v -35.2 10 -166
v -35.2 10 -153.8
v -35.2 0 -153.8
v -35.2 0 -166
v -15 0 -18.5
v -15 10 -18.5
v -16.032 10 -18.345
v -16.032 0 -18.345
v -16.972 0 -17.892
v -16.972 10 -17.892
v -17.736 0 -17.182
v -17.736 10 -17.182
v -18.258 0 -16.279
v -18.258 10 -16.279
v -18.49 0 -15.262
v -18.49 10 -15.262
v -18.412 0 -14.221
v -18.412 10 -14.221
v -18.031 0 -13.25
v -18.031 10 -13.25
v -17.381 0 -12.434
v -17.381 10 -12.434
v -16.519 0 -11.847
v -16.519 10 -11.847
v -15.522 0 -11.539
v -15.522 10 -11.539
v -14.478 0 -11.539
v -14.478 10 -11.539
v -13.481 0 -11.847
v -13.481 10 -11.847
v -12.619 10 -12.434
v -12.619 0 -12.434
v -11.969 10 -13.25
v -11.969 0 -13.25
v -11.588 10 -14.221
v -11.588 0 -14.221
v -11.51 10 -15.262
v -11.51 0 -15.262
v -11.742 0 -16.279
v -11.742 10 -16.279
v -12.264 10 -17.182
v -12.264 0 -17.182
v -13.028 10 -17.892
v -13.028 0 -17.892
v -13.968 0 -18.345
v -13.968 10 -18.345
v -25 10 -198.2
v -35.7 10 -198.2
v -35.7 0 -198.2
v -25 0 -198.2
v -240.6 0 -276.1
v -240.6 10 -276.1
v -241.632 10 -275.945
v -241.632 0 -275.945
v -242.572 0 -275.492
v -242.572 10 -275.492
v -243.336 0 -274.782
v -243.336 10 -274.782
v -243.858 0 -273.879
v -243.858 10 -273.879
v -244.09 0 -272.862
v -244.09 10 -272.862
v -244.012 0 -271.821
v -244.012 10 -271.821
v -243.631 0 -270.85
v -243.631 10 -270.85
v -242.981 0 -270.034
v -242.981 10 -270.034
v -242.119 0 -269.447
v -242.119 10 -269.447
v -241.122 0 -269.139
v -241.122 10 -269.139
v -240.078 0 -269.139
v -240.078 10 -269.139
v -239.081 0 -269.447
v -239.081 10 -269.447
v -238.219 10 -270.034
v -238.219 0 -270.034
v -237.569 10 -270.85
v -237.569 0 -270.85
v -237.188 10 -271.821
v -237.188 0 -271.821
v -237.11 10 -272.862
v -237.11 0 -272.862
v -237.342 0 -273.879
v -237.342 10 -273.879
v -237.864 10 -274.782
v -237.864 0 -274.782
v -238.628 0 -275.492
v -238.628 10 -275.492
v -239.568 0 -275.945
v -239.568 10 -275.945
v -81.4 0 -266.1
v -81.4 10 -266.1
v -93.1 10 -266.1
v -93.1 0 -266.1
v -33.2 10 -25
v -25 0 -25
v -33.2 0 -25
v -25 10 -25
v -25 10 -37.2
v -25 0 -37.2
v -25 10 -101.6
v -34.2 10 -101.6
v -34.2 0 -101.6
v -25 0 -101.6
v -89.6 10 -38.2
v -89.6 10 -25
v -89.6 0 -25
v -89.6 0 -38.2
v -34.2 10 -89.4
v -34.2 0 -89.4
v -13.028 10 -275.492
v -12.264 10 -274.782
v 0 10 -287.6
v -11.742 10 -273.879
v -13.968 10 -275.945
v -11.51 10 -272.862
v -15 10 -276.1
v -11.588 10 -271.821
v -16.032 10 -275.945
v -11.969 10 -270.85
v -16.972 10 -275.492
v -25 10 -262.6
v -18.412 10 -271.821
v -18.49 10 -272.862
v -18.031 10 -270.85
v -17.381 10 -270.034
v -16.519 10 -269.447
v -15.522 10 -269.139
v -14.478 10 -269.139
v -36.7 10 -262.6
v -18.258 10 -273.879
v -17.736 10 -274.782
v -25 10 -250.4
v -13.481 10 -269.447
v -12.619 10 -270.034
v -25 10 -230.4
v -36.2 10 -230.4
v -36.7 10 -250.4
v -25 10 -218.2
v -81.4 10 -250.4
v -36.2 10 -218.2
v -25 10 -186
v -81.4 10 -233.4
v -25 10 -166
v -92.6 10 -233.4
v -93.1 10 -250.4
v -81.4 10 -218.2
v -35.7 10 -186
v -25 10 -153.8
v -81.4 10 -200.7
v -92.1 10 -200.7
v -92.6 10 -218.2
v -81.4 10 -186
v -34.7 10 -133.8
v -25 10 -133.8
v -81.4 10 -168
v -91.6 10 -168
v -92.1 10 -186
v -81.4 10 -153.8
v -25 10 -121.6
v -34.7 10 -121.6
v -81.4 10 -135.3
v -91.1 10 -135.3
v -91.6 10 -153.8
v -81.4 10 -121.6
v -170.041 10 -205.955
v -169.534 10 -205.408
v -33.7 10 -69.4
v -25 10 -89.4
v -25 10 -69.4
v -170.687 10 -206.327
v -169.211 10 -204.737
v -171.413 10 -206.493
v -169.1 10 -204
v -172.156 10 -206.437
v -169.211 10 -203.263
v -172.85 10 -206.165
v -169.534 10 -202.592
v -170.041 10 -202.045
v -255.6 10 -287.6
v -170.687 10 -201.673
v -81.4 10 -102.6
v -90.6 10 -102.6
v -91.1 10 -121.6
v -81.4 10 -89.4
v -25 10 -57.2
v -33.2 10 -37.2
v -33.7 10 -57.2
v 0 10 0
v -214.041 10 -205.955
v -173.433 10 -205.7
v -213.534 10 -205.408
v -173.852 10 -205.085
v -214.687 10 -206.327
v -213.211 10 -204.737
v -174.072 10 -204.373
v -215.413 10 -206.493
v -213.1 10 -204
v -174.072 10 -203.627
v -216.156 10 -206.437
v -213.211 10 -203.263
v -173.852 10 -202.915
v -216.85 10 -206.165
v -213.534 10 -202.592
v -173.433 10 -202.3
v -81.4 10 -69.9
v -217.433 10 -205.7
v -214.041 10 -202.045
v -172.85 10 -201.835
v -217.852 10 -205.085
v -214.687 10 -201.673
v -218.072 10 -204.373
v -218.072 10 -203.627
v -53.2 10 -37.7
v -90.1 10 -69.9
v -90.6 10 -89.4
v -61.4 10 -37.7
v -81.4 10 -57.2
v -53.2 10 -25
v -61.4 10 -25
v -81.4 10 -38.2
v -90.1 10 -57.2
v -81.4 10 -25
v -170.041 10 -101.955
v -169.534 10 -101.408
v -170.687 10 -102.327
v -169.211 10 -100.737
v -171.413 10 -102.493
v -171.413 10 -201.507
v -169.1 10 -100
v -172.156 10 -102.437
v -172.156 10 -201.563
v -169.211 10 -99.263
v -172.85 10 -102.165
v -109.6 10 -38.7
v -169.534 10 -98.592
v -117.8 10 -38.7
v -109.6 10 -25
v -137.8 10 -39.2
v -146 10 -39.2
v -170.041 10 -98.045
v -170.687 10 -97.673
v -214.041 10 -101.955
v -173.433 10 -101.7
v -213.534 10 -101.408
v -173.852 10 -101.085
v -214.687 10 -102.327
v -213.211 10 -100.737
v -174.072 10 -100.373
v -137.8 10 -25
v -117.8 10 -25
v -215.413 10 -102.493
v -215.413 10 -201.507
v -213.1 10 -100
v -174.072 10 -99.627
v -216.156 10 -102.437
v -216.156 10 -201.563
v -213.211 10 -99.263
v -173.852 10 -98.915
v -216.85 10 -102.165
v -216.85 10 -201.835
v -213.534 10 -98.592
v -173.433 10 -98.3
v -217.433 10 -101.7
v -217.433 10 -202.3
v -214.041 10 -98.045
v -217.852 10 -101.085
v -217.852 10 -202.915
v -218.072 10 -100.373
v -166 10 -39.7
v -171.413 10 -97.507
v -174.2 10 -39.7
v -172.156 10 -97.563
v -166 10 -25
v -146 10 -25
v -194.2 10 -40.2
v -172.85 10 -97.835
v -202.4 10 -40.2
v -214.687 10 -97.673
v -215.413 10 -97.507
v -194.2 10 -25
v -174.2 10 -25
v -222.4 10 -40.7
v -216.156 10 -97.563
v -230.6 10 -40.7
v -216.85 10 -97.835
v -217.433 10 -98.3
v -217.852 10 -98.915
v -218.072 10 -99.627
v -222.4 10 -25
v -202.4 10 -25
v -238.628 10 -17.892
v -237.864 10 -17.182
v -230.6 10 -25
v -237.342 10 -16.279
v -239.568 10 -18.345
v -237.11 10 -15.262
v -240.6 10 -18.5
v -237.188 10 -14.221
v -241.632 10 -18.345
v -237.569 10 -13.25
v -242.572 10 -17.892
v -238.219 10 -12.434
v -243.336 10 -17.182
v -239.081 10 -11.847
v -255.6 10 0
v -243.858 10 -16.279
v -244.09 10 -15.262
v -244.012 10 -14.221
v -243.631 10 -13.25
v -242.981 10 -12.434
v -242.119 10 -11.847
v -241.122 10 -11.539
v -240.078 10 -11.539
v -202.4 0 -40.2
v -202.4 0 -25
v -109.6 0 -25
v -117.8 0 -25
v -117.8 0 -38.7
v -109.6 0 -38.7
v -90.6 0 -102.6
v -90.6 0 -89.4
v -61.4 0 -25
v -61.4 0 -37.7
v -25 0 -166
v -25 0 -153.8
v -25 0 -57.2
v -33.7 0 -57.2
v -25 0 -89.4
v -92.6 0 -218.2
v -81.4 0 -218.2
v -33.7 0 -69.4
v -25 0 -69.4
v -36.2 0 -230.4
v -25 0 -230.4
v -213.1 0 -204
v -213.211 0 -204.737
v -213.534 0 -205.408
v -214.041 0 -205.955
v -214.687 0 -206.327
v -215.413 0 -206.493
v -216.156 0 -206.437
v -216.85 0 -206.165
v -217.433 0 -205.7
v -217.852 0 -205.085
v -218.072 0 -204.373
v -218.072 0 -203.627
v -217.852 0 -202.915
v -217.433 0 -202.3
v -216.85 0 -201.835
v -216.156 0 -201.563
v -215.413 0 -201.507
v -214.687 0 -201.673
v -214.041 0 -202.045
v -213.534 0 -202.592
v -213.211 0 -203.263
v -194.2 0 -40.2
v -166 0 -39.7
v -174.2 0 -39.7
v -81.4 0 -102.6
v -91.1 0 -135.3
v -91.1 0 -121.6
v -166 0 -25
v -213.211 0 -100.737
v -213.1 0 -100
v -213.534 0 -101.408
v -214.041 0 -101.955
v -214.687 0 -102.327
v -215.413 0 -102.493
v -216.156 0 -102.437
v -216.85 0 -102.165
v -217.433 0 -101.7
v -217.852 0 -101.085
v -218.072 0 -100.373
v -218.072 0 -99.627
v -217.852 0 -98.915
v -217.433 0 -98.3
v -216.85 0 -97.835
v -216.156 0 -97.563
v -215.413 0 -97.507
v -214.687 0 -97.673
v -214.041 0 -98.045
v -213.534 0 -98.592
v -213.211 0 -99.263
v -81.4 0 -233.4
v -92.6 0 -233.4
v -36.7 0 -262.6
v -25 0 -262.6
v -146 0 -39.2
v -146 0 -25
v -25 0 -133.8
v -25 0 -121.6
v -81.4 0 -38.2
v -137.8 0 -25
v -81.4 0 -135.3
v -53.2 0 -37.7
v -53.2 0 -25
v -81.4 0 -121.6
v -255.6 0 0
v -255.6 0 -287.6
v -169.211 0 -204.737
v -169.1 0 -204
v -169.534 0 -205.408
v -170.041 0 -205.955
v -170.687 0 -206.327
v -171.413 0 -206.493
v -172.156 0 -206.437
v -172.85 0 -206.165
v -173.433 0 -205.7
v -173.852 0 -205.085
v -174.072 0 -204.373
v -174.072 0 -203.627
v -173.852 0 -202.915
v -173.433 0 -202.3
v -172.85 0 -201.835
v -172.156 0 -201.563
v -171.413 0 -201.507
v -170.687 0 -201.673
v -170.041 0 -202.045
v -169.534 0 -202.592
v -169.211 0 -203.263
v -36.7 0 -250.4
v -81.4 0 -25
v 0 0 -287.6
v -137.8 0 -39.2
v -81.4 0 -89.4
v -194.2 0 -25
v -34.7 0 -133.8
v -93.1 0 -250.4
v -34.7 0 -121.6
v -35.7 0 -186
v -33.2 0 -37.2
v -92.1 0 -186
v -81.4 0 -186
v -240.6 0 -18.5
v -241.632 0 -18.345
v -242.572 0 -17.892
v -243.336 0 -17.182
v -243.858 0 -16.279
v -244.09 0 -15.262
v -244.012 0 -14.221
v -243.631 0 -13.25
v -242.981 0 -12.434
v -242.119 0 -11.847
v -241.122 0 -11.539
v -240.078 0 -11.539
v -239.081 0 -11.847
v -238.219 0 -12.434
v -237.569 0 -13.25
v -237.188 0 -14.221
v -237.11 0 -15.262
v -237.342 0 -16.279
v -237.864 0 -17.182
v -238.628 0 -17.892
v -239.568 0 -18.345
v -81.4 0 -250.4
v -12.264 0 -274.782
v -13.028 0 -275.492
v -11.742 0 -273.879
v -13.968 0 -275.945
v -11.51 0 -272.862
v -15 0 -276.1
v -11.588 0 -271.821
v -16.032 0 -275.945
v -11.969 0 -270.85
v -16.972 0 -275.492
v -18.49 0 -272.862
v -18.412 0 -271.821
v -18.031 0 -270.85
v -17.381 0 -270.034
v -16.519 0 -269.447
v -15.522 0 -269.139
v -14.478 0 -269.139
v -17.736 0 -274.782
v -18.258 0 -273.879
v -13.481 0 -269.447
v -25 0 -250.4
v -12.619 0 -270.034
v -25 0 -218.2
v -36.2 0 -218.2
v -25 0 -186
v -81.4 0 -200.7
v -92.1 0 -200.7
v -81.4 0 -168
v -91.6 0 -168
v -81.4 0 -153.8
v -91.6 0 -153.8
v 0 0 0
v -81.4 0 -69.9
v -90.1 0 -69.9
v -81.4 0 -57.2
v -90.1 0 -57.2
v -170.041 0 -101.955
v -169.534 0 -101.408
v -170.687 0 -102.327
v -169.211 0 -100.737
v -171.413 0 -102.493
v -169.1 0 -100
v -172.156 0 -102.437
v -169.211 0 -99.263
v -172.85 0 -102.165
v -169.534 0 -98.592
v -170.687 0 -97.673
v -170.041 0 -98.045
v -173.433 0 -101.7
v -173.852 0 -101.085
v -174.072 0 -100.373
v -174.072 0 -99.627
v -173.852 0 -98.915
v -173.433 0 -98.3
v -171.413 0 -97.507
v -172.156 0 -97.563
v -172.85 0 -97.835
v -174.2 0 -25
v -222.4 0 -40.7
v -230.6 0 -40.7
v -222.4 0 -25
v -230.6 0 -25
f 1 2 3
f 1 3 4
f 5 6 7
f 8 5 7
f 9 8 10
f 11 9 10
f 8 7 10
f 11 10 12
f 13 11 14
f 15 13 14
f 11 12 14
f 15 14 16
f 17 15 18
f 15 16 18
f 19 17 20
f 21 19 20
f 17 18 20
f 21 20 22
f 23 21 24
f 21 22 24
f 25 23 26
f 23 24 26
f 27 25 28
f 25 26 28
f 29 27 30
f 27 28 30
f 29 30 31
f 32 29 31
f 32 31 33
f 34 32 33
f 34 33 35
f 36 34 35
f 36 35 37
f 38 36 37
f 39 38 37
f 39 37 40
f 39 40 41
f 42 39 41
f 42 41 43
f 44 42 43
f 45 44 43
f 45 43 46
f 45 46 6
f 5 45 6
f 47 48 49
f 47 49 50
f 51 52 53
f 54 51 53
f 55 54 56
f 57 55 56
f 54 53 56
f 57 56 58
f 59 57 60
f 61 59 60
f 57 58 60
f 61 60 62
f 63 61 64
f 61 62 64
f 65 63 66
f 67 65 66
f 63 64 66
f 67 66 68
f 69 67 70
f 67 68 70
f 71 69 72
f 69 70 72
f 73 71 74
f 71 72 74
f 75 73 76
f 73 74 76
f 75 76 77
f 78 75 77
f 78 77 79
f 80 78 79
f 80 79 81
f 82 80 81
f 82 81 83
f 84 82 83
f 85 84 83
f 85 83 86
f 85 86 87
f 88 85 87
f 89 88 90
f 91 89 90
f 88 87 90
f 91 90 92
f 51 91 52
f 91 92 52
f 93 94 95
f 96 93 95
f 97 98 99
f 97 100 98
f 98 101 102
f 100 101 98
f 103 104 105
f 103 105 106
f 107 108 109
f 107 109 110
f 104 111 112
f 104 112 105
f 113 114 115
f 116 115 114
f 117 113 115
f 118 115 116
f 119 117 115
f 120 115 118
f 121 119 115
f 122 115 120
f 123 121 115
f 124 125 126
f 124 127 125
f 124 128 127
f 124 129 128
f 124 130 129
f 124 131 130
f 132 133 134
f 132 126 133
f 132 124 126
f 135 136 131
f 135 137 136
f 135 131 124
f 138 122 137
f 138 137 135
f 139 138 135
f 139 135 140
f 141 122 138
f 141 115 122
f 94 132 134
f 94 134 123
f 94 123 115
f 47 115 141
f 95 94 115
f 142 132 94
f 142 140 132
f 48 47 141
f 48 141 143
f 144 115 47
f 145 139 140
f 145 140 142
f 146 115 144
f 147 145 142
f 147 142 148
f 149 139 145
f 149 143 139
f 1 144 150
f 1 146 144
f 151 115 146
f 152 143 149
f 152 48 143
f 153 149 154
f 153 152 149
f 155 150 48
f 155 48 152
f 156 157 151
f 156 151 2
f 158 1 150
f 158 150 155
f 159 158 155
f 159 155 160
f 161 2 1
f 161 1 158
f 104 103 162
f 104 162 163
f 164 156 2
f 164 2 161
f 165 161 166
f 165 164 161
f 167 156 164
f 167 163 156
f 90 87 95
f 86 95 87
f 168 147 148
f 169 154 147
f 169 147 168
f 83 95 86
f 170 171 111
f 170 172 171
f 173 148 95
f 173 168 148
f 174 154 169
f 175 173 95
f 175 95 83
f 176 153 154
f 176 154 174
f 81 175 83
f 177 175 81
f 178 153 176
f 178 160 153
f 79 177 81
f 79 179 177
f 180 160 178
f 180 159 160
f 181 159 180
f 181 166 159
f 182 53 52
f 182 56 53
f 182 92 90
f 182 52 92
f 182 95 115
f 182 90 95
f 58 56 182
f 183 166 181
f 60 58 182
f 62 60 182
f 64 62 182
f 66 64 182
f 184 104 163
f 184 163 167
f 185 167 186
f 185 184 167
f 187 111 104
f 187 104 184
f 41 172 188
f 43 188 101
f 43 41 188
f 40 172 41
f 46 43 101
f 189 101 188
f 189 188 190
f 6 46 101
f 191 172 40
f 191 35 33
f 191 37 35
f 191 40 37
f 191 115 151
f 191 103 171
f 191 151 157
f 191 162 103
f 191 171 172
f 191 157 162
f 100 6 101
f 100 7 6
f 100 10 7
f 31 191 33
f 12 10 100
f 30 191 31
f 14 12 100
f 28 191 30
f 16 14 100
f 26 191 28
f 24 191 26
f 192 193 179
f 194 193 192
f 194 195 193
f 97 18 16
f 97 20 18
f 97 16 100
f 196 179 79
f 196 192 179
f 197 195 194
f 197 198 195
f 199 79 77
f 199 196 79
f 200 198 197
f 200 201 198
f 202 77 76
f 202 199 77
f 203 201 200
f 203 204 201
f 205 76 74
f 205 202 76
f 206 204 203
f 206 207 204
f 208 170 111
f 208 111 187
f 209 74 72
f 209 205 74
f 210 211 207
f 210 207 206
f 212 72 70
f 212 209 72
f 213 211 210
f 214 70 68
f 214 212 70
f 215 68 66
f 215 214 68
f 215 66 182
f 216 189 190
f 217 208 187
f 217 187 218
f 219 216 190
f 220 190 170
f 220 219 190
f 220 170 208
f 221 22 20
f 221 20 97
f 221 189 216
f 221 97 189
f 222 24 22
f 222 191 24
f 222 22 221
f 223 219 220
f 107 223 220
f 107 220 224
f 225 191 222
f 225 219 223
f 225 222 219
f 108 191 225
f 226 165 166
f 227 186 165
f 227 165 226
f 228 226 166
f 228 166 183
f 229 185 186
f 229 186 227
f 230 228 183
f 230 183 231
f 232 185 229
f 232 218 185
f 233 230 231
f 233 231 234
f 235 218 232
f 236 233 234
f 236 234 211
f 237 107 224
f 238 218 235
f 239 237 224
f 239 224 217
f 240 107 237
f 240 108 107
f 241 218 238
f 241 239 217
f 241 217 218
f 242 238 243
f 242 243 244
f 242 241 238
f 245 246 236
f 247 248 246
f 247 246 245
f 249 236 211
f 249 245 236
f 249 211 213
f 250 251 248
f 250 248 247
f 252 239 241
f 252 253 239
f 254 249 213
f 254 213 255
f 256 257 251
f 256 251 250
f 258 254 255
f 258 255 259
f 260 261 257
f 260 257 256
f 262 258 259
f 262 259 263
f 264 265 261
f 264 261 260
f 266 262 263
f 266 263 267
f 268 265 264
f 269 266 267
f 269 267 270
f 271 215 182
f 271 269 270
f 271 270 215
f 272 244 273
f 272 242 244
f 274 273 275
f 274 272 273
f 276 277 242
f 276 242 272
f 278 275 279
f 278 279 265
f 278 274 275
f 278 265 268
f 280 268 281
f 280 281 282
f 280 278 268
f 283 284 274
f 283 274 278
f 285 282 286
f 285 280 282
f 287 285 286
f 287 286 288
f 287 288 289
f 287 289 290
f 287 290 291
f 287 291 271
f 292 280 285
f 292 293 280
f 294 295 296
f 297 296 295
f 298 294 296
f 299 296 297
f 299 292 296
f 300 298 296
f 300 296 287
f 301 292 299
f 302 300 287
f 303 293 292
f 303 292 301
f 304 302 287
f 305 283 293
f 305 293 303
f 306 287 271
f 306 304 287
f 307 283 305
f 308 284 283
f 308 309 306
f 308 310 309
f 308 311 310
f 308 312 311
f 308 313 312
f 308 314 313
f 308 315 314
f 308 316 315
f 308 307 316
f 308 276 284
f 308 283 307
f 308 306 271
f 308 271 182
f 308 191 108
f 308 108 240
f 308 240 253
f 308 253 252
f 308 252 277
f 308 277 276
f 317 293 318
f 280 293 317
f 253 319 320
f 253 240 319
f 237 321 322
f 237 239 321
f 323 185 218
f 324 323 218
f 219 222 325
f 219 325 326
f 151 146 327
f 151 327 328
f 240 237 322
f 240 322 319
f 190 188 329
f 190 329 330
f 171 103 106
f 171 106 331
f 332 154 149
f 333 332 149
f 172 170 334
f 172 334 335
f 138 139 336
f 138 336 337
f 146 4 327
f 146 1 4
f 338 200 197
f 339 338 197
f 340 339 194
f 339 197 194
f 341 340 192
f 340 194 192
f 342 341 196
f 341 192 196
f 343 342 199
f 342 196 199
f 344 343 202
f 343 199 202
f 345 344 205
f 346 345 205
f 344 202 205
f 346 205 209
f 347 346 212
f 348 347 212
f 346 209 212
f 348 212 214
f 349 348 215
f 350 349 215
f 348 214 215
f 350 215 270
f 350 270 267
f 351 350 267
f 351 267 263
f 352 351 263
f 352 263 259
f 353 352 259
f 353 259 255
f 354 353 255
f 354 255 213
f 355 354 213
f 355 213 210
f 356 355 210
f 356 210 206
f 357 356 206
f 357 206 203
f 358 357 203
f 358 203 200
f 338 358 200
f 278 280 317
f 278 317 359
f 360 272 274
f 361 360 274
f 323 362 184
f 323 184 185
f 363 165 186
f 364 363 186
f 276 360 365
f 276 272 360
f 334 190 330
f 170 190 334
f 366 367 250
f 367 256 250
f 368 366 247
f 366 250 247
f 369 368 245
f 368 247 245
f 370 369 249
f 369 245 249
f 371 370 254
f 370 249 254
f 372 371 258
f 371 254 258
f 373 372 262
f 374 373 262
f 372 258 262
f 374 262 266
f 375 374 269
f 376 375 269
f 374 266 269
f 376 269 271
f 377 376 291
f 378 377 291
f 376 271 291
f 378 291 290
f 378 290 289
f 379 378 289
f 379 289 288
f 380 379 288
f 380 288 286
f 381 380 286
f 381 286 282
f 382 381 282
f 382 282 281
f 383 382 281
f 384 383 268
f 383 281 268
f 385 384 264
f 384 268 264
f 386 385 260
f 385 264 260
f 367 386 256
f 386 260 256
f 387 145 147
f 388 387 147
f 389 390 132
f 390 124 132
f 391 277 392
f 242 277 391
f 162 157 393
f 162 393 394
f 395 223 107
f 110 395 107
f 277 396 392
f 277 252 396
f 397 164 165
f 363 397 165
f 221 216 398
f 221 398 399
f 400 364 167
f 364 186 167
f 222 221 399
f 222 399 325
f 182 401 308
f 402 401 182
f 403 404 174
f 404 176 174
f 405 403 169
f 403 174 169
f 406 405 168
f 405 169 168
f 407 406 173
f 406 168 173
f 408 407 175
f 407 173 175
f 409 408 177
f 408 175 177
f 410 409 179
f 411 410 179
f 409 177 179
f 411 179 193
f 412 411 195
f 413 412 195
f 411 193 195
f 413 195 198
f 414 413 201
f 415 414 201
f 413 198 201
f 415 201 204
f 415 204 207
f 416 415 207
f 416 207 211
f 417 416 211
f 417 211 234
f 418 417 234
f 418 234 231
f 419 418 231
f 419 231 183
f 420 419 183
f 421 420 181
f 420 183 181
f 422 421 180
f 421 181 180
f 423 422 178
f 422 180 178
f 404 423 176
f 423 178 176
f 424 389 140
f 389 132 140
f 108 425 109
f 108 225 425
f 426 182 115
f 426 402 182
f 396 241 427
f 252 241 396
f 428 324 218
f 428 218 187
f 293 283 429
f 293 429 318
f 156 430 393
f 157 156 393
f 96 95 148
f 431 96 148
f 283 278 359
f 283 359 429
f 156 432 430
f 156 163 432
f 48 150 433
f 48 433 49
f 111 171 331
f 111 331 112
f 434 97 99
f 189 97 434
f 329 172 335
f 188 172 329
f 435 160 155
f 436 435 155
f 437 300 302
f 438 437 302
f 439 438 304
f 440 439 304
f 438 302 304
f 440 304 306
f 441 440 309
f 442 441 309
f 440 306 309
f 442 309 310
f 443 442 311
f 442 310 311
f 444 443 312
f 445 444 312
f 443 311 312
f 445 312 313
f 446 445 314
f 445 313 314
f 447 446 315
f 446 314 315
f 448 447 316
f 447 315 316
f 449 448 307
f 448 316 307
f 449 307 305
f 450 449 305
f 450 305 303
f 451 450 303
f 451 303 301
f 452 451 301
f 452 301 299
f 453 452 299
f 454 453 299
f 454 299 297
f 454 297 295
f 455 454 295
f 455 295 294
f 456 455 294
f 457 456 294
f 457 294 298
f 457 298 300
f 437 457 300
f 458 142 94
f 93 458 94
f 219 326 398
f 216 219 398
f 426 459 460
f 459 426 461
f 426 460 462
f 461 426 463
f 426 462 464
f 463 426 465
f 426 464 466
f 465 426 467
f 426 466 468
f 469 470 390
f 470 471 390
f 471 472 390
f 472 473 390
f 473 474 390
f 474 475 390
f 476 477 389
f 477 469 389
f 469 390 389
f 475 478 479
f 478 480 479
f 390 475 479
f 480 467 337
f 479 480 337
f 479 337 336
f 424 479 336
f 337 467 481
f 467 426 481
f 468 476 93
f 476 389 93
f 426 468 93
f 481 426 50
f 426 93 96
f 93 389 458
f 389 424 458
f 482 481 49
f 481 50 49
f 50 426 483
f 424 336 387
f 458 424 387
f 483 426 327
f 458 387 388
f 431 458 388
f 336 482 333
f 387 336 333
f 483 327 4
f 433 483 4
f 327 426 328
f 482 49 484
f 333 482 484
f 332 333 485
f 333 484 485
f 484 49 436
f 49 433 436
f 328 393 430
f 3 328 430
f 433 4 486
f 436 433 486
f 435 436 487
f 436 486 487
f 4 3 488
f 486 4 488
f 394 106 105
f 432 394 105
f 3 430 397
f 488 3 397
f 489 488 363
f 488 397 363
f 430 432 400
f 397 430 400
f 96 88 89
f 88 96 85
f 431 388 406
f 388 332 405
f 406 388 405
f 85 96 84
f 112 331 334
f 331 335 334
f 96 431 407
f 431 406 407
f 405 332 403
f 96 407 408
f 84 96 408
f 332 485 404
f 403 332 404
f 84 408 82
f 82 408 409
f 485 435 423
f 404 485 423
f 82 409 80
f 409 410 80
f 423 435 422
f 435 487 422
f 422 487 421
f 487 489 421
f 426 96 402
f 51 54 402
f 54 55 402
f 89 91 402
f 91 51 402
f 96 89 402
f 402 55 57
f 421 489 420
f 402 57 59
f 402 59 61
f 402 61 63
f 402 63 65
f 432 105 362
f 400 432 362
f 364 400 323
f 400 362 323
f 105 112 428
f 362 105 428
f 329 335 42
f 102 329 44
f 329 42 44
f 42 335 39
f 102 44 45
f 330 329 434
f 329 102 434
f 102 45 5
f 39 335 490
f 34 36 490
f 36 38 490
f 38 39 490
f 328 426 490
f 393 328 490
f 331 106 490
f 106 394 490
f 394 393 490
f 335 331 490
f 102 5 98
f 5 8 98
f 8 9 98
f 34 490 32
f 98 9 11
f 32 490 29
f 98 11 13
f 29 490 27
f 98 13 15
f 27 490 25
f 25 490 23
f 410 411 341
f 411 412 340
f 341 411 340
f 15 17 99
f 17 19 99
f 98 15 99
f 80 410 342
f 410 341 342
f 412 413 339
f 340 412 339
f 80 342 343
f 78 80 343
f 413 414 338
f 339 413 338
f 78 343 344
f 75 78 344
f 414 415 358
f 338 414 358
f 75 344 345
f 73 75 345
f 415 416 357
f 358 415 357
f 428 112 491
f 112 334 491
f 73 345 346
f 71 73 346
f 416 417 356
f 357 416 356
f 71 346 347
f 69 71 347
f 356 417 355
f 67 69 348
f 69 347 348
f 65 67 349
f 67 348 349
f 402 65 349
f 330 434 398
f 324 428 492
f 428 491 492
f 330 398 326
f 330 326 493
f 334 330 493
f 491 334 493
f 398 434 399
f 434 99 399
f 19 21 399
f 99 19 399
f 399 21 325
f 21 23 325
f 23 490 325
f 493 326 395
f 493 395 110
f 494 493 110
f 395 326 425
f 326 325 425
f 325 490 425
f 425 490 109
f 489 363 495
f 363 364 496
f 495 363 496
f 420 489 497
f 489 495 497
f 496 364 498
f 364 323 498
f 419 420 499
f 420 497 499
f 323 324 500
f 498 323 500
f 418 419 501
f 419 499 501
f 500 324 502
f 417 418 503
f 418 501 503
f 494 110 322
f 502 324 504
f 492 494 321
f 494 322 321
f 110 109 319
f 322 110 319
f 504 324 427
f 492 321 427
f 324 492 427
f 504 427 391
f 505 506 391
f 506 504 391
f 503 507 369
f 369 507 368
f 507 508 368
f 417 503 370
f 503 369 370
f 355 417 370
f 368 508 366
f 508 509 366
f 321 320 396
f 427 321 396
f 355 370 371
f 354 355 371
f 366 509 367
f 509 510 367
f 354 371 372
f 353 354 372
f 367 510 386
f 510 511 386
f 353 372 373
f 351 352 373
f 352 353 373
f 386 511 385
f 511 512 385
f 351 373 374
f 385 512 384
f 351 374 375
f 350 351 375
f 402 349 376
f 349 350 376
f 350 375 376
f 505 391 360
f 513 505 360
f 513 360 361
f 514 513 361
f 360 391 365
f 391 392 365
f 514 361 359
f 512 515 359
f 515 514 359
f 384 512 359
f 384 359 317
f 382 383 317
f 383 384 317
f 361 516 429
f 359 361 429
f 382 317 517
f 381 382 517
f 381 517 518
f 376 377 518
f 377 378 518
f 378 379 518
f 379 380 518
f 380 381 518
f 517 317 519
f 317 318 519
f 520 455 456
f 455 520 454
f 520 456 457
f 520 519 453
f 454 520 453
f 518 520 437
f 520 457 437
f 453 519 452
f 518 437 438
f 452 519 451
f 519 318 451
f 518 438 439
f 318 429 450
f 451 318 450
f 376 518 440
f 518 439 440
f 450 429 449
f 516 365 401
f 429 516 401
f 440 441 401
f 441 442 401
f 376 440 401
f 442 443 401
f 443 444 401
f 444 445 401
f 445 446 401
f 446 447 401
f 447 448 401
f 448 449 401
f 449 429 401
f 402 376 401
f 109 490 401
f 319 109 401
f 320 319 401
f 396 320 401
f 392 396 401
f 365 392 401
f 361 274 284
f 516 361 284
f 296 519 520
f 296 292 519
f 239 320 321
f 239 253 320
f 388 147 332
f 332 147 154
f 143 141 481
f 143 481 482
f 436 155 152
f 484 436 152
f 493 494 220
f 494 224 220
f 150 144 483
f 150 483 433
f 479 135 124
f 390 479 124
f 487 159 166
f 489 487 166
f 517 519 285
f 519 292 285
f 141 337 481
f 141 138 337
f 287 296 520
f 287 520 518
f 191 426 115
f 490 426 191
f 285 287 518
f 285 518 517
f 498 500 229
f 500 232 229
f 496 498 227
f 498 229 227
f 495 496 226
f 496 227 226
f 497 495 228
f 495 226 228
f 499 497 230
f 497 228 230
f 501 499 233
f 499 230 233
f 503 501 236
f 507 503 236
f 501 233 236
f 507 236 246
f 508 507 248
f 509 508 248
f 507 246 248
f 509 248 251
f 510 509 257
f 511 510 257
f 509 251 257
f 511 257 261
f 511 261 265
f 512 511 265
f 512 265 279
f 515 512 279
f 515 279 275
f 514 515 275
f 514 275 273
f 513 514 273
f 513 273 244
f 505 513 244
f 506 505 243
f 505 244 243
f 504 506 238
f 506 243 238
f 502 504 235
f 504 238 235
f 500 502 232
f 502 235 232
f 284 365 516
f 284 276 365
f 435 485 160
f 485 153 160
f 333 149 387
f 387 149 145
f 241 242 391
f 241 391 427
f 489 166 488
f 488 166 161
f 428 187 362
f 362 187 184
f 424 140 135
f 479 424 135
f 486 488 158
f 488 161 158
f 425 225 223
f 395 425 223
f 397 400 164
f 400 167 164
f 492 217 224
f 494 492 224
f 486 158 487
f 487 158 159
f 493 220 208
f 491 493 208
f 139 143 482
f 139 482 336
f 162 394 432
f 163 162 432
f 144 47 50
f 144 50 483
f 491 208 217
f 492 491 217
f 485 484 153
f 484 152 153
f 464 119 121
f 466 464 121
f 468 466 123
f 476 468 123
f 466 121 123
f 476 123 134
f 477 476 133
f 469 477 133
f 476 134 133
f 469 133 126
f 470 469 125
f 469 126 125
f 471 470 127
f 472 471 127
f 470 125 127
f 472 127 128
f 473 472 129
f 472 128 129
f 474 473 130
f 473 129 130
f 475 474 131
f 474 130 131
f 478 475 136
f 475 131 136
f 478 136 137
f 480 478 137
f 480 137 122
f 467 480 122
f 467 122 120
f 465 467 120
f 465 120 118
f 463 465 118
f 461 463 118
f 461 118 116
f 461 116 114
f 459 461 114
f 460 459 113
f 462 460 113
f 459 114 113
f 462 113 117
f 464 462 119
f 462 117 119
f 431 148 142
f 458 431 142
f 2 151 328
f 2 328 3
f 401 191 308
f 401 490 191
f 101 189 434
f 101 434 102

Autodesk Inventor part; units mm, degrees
ref_plane "YZ Plane" through (0, 0, 0) normal (1, 0, 0) x (0, 1, 0)
ref_plane "XZ Plane" through (0, 0, 0) normal (0, 1, 0) x (-1, 0, 0)
ref_plane "XY Plane" through (0, 0, 0) normal (0, 0, 1) x (1, 0, 0)
sketch "Skizze1" plane through (0, 0, 0) normal (0, 1, 0) x (-1, 0, 0)
  line L0 (0, 0) -> (255.6, 0)
  line L1 (255.6, 0) -> (255.6, -287.6)
  line L2 (255.6, -287.6) -> (0, -287.6)
  line L3 (0, -287.6) -> (0, 0)
  dimension "d0" = 287.6
  dimension "d1" = 255.6
extrude "Extrusion1" add sketch "Skizze1" along normal blind 10
sketch "Skizze4" plane through (0, 10, 0) normal (0, 1, 0) x (1, 0, 0)
  line L0 (-25, 25) -> (-33.2, 25)
  line L1 (-33.2, 25) -> (-33.2, 37.2)
  line L2 (-33.2, 37.2) -> (-25, 37.2)
  line L3 (-25, 37.2) -> (-25, 25)
  line L4 (-109.6, 25) -> (-117.8, 25)
  line L5 (-117.8, 25) -> (-117.8, 38.7)
  line L6 (-117.8, 38.7) -> (-109.6, 38.7)
  line L7 (-109.6, 38.7) -> (-109.6, 25)
  line L8 (-137.8, 25) -> (-146, 25)
  line L9 (-146, 25) -> (-146, 39.2)
  line L10 (-146, 39.2) -> (-137.8, 39.2)
  line L11 (-137.8, 39.2) -> (-137.8, 25)
  line L12 (-166, 39.7) -> (-166, 25)
  line L13 (-222.4, 25) -> (-230.6, 25)
  line L14 (-230.6, 25) -> (-230.6, 40.7)
  line L15 (-25, 57.2) -> (-33.7, 57.2)
  line L16 (-33.7, 57.2) -> (-33.7, 69.4)
  line L17 (-33.7, 69.4) -> (-25, 69.4)
  line L18 (-25, 69.4) -> (-25, 57.2)
  line L19 (-25, 89.4) -> (-34.2, 89.4)
  line L20 (-34.2, 89.4) -> (-34.2, 101.6)
  line L21 (-34.2, 101.6) -> (-25, 101.6)
  line L22 (-25, 101.6) -> (-25, 89.4)
  line L23 (-25, 121.6) -> (-34.7, 121.6)
  line L24 (-34.7, 121.6) -> (-34.7, 133.8)
  line L25 (-34.7, 133.8) -> (-25, 133.8)
  line L26 (-25, 133.8) -> (-25, 121.6)
  line L27 (-25, 153.8) -> (-35.2, 153.8)
  line L28 (-35.2, 153.8) -> (-35.2, 166)
  line L29 (-35.2, 166) -> (-25, 166)
  line L30 (-25, 166) -> (-25, 153.8)
  line L31 (-25, 186) -> (-35.7, 186)
  line L32 (-35.7, 186) -> (-35.7, 198.2)
  line L33 (-35.7, 198.2) -> (-25, 198.2)
  line L34 (-25, 198.2) -> (-25, 186)
  line L35 (-25, 230.4) -> (-25, 218.2)
  line L36 (-222.4, 25) -> (-222.4, 38.5)
  line L37 (-222.4, 38.5) -> (-222.4, 40.7)
  line L38 (-230.6, 40.7) -> (-222.4, 40.7)
  line L39 (-25, 218.2) -> (-36.2, 218.2)
  line L40 (-36.2, 218.2) -> (-36.2, 230.4)
  line L41 (-36.2, 230.4) -> (-25, 230.4)
  line L42 (-25, 250.4) -> (-25, 262.6)
  line L43 (-25, 262.6) -> (-36.7, 262.6)
  line L44 (-36.7, 262.6) -> (-36.7, 250.4)
  line L45 (-36.7, 250.4) -> (-25, 250.4)
  line L46 (-53.2, 25) -> (-61.4, 25)
  line L47 (-61.4, 25) -> (-61.4, 37.7)
  line L48 (-61.4, 37.7) -> (-53.2, 37.7)
  line L49 (-53.2, 37.7) -> (-53.2, 25)
  line L50 (-89.6, 25) -> (-89.6, 37.7)
  line L51 (-89.6, 37.7) -> (-89.6, 38.2)
  line L52 (0, 0) -> (0, 287.6) projected
  line L53 (-255.6, 0) -> (0, 0) projected
  line L54 (-81.4, 69.9) -> (-90.1, 69.9)
  line L55 (-90.1, 69.9) -> (-90.1, 57.2)
  line L56 (-90.1, 57.2) -> (-81.4, 57.2)
  line L57 (-81.4, 102.6) -> (-90.6, 102.6)
  line L58 (-90.6, 102.6) -> (-90.6, 89.4)
  line L59 (-90.6, 89.4) -> (-81.4, 89.4)
  line L60 (-81.4, 121.6) -> (-81.4, 135.3)
  line L61 (-81.4, 135.3) -> (-91.1, 135.3)
  line L62 (-91.1, 135.3) -> (-91.1, 121.6)
  line L63 (-91.1, 121.6) -> (-81.4, 121.6)
  line L64 (-81.4, 153.8) -> (-81.4, 168)
  line L65 (-81.4, 168) -> (-91.6, 168)
  line L66 (-91.6, 168) -> (-91.6, 153.8)
  line L67 (-91.6, 153.8) -> (-81.4, 153.8)
  line L68 (-81.4, 186) -> (-81.4, 200.7)
  line L69 (-81.4, 200.7) -> (-92.1, 200.7)
  line L70 (-92.1, 200.7) -> (-92.1, 186)
  line L71 (-92.1, 186) -> (-81.4, 186)
  line L72 (-81.4, 218.2) -> (-81.4, 233.4)
  line L73 (-81.4, 233.4) -> (-92.6, 233.4)
  line L74 (-92.6, 233.4) -> (-92.6, 218.2)
  line L75 (-92.6, 218.2) -> (-81.4, 218.2)
  line L76 (-81.4, 250.4) -> (-81.4, 266.1)
  line L77 (-81.4, 266.1) -> (-93.1, 266.1)
  line L78 (-93.1, 266.1) -> (-93.1, 250.4)
  line L79 (-93.1, 250.4) -> (-81.4, 250.4)
  line L80 (-194.2, 25) -> (-202.4, 25)
  line L81 (-202.4, 25) -> (-202.4, 40.2)
  line L82 (-202.4, 40.2) -> (-194.2, 40.2)
  line L83 (-194.2, 40.2) -> (-194.2, 25)
  line L84 (-166, 25) -> (-174.2, 25)
  line L85 (-166, 39.7) -> (-174.2, 39.7)
  line L86 (-174.2, 39.7) -> (-174.2, 25)
  line L87 (-166, 25) -> (-174.2, 25)
  line L88 (-81.4, 25) -> (-89.6, 25)
  line L89 (-81.4, 25) -> (-81.4, 38.2)
  line L90 (-81.4, 38.2) -> (-89.6, 38.2)
  line L91 (-202.4, 25) -> (-194.2, 25)
  line L92 (-174.2, 25) -> (-166, 25)
  line L93 (-146, 25) -> (-137.8, 25)
  line L94 (-137.8, 25) -> (-146, 25)
  line L95 (-109.6, 25) -> (-117.8, 25)
  line L96 (-81.4, 25) -> (-89.6, 25)
  line L97 (-25, 25) -> (-33.2, 25)
  line L98 (-53.2, 25) -> (-61.4, 25)
  line L99 (-166, 25) -> (-174.2, 25)
  line L100 (-194.2, 25) -> (-202.4, 25)
  line L101 (-222.4, 25) -> (-230.6, 25)
  line L102 (-25, 57.2) -> (-33.7, 57.2)
  line L103 (-81.4, 57.2) -> (-90.1, 57.2)
  line L104 (-25, 89.4) -> (-34.2, 89.4)
  line L105 (-81.4, 89.4) -> (-90.6, 89.4)
  line L106 (-25, 121.6) -> (-34.7, 121.6)
  line L107 (-81.4, 121.6) -> (-91.1, 121.6)
  line L108 (-25, 153.8) -> (-35.2, 153.8)
  line L109 (-81.4, 153.8) -> (-91.6, 153.8)
  line L110 (-25, 186) -> (-35.7, 186)
  line L111 (-81.4, 186) -> (-92.1, 186)
  line L112 (-25, 218.2) -> (-36.2, 218.2)
  line L113 (-81.4, 218.2) -> (-92.6, 218.2)
  line L114 (-25, 250.4) -> (-36.7, 250.4)
  line L115 (-81.4, 250.4) -> (-93.1, 250.4)
  line L116 (-81.4, 26.1) -> (-81.4, 294.0046)
  line L117 (-81.4, 69.9) -> (-81.4, 47.2)
  line L118 (-90.1, 57.2) -> (-90.1, 69.9)
  line L119 (-81.4, 89.4) -> (-81.4, 102.6)
  line L120 (-90.6, 102.6) -> (-90.6, 89.4)
  line L121 (-25, 25) -> (-25, 285.2671)
  line L122 (-25, 25) -> (-258.6914, 25)
  line L123 (0, 287.6) -> (-255.6, 287.6) projected
  line L124 (-255.6, 287.6) -> (-255.6, 0) projected
  point P0 (-29.6, 89.4)
  point P1 (-29.35, 69.4)
  point P2 (-29.85, 121.6)
  point P3 (-29.6, 101.6)
  point P4 (-30.1, 153.8)
  point P5 (-29.85, 133.8)
  point P6 (-30.35, 186)
  point P7 (-30.1, 166)
  point P8 (-30.6, 218.2)
  point P9 (-30.35, 198.2)
  point P10 (-30.85, 250.4)
  point P11 (-30.6, 230.4)
  point P12 (-81.4, 25)
  point P13 (-53.2, 31.35)
  point P14 (-61.4, 31.35)
  point P15 (-109.6, 31.85)
  point P16 (-137.8, 32.1)
  point P17 (-117.8, 31.85)
  point P18 (-166, 27.1)
  point P19 (-146, 32.1)
  point P20 (-169.2, 27.6)
  point P21 (-222.4, 31.75)
  point P22 (-25, 31.1)
  point P23 (-29.1, 25)
  point P24 (-29.35, 57.2)
  point P25 (-85.75, 57.2)
  point P26 (-86.25, 121.6)
  point P27 (-141.9, 25)
  point P28 (-86.5, 153.8)
  point P29 (-86.75, 186)
  point P30 (-87, 218.2)
  point P31 (-81.4, 225.8)
  point P32 (-81.4, 258.25)
  point P33 (-226.5, 40.7)
  point P34 (-86, 102.6)
  point P35 (-86.25, 135.3)
  point P36 (-86.75, 200.7)
  point P37 (-87.25, 250.4)
  point P38 (-87, 233.4)
  point P39 (-86, 89.4)
  point P40 (-85.75, 69.9)
  point P41 (-86.5, 168)
  point P42 (-33.7, 63.3)
  point P43 (-80, 91)
  point P44 (-34.2, 95.5)
  point P45 (-81.4, 128.45)
  point P46 (-34.7, 127.7)
  point P47 (-81.4, 160.9)
  point P48 (-35.2, 159.9)
  point P49 (-81.4, 193.35)
  point P50 (-35.7, 192.1)
  point P51 (-36.2, 224.3)
  point P52 (-36.7, 256.5)
  point P53 (-81.4, 58.55)
  point P54 (-76, 52.7)
  point P55 (-76, 65.4)
  point P56 (-25, 256.5)
  point P57 (-57.3, 25)
  point P58 (-29.6, 89.4)
  point P59 (-86, 89.4)
  point P60 (-87, 218.2)
  point P61 (-30.6, 218.2)
  point P62 (-87.25, 250.4)
  point P63 (-30.85, 250.4)
  point P64 (-85.75, 57.2)
  point P65 (-85.5, 38.2)
  point P66 (-29.35, 57.2)
  point P67 (-30.35, 186)
  point P68 (-87.25, 266.1)
  point P69 (-30.85, 262.6)
  point P70 (-230.6, 32.85)
  point P71 (-81.4, 31.6)
  point P72 (-226.5, 25)
  dimension "d10" = 8.2
  dimension "d11" = 12.2
  dimension "d17" = 12.2
  dimension "d18" = 9.2
  dimension "d19" = 12.2
  dimension "d20" = 9.7
  dimension "d21" = 12.2
  dimension "d22" = 10.2
  dimension "d23" = 12.2
  dimension "d24" = 10.7
  dimension "d25" = 12.2
  dimension "d27" = 12.2
  dimension "d29" = 13.7
  dimension "d30" = 14.2
  dimension "d32" = 14.7
  dimension "d53" = 11.2
  dimension "d60" = 12.2
  dimension "d61" = 11.7
  dimension "d64" = 12.7
  dimension "d65" = 8.2
  dimension "d79" = 12.7
  dimension "d80" = 13.2
  dimension "d81" = 9.2
  dimension "d82" = 13.7
  dimension "d83" = 9.7
  dimension "d84" = 14.2
  dimension "d85" = 10.2
  dimension "d86" = 14.7
  dimension "d87" = 10.7
  dimension "d88" = 15.2
  dimension "d89" = 11.2
  dimension "d90" = 15.7
  dimension "d91" = 11.7
  dimension "d149" = 15.7
  dimension "d152" = 8.2
  dimension "d153" = 8.2
  dimension "d155" = 20
  dimension "d156" = 8.2
  dimension "d159" = 20
  dimension "d160" = 20
  dimension "d162" = 20
  dimension "d163" = 20
  dimension "d164" = 20
  dimension "d165" = 20
  dimension "d166" = 20
  dimension "d167" = 20
  dimension "d168" = 20
  dimension "d169" = 20
  dimension "d187" = 19
  dimension "d188" = 18.5
  dimension "d189" = 18
  dimension "d191" = 17.5
  dimension "d197" = 8.2
  dimension "d198" = 15.2
  dimension "d199" = 20
  dimension "d200" = 8.2
  dimension "d201" = 20
  dimension "d203" = 8.2
  dimension "d205" = 13.2
  dimension "d207" = 8.7
  dimension "d209" = 45.8
  dimension "d219" = 8.7
  dimension "d239" = 0
  dimension "d240" = 0
extrude "Extrusion4" cut sketch "Skizze4" against normal blind 30 contours L88 L50 L51 L90 L89 | L46 L47 L48 L49 | L45 L44 L43 L42 | L39 L40 L41 L35 | L31 L32 L33 L34 | L27 L28 L29 L30 | L23 L24 L25 L26 | L19 L20 L21 L22 | L15 L16 L17 L18 | L0 L1 L2 L3 | L4 L5 L6 L7 | L8 L9 L10 L11 | L56 L55 L54 L116 | L84 L86 L85 L12 | L59 L58 L57 L116 | L80 L81 L82 L83 | L63 L62 L61 L60 | L13 L14 L38 L37 L36 | L67 L66 L65 L64 | L71 L70 L69 L68 | L75 L74 L73 L72 | L76 L79 L78 L77
sketch "Skizze5" plane through (0, 10, 0) normal (0, 1, 0) x (1, 0, 0)
  circle A0 centre (-215.6, 100) radius 2.5
  circle A1 centre (-215.6, 204) radius 2.5
  line L0 (-255.6, 0) -> (0, 0) projected
  line L1 (-255.6, 287.6) -> (-255.6, 0) projected
  circle A2 centre (-171.6, 100) radius 2.5
  circle A3 centre (-171.6, 204) radius 2.5
  line L2 (-171.6, 100) -> (-215.6, 100)
  line L3 (-215.6, 100) -> (-215.6, 204)
  line L4 (-215.6, 204) -> (-171.6, 204)
  line L5 (-171.6, 204) -> (-171.6, 100)
  dimension "d110" = 5
  dimension "d116" = 5
  dimension "d119" = 100
  dimension "d224" = 5
  dimension "d225" = 5
  dimension "d230" = 104
  dimension "d231" = 44
  dimension "d233" = 40
  dimension "d234" = 0
extrude "Extrusion5" cut sketch "Skizze5" against normal blind 30 contours L2 L3 A0 | A0 L3 L2 | L2 L5 A2 | A2 L5 L2 | L3 L4 A1 | A1 L4 L3 | L5 L4 A3 | A3 L4 L5
sketch "Skizze6" plane through (0, 0, 0) normal (0, -1, 0) x (1, 0, 0)
  line L0 (-255.6, -287.6) -> (-255.6, 0) projected
  line L1 (-255.6, 0) -> (0, 0) projected
  line L2 (0, 0) -> (0, -287.6) projected
  line L3 (0, -287.6) -> (-255.6, -287.6) projected
  point P0 (-240.6, -15)
  point P1 (-240.6, -272.6)
  point P2 (-15, -272.6)
  point P3 (-15, -15)
  dimension "d265" = 15
  dimension "d266" = 15
  dimension "d267" = 15
  dimension "d268" = 15
  dimension "d269" = 15
  dimension "d270" = 15
  dimension "d271" = 15
  dimension "d272" = 15
hole "Bohrung1" at (-240.6, 0, -15) at (-240.6, 0, -272.6) at (-15, 0, -272.6) at (-15, 0, -15) direction (0, 1, 0) diameter 7 depth 10
properties part number "Board_Maria_3D-Druck"
